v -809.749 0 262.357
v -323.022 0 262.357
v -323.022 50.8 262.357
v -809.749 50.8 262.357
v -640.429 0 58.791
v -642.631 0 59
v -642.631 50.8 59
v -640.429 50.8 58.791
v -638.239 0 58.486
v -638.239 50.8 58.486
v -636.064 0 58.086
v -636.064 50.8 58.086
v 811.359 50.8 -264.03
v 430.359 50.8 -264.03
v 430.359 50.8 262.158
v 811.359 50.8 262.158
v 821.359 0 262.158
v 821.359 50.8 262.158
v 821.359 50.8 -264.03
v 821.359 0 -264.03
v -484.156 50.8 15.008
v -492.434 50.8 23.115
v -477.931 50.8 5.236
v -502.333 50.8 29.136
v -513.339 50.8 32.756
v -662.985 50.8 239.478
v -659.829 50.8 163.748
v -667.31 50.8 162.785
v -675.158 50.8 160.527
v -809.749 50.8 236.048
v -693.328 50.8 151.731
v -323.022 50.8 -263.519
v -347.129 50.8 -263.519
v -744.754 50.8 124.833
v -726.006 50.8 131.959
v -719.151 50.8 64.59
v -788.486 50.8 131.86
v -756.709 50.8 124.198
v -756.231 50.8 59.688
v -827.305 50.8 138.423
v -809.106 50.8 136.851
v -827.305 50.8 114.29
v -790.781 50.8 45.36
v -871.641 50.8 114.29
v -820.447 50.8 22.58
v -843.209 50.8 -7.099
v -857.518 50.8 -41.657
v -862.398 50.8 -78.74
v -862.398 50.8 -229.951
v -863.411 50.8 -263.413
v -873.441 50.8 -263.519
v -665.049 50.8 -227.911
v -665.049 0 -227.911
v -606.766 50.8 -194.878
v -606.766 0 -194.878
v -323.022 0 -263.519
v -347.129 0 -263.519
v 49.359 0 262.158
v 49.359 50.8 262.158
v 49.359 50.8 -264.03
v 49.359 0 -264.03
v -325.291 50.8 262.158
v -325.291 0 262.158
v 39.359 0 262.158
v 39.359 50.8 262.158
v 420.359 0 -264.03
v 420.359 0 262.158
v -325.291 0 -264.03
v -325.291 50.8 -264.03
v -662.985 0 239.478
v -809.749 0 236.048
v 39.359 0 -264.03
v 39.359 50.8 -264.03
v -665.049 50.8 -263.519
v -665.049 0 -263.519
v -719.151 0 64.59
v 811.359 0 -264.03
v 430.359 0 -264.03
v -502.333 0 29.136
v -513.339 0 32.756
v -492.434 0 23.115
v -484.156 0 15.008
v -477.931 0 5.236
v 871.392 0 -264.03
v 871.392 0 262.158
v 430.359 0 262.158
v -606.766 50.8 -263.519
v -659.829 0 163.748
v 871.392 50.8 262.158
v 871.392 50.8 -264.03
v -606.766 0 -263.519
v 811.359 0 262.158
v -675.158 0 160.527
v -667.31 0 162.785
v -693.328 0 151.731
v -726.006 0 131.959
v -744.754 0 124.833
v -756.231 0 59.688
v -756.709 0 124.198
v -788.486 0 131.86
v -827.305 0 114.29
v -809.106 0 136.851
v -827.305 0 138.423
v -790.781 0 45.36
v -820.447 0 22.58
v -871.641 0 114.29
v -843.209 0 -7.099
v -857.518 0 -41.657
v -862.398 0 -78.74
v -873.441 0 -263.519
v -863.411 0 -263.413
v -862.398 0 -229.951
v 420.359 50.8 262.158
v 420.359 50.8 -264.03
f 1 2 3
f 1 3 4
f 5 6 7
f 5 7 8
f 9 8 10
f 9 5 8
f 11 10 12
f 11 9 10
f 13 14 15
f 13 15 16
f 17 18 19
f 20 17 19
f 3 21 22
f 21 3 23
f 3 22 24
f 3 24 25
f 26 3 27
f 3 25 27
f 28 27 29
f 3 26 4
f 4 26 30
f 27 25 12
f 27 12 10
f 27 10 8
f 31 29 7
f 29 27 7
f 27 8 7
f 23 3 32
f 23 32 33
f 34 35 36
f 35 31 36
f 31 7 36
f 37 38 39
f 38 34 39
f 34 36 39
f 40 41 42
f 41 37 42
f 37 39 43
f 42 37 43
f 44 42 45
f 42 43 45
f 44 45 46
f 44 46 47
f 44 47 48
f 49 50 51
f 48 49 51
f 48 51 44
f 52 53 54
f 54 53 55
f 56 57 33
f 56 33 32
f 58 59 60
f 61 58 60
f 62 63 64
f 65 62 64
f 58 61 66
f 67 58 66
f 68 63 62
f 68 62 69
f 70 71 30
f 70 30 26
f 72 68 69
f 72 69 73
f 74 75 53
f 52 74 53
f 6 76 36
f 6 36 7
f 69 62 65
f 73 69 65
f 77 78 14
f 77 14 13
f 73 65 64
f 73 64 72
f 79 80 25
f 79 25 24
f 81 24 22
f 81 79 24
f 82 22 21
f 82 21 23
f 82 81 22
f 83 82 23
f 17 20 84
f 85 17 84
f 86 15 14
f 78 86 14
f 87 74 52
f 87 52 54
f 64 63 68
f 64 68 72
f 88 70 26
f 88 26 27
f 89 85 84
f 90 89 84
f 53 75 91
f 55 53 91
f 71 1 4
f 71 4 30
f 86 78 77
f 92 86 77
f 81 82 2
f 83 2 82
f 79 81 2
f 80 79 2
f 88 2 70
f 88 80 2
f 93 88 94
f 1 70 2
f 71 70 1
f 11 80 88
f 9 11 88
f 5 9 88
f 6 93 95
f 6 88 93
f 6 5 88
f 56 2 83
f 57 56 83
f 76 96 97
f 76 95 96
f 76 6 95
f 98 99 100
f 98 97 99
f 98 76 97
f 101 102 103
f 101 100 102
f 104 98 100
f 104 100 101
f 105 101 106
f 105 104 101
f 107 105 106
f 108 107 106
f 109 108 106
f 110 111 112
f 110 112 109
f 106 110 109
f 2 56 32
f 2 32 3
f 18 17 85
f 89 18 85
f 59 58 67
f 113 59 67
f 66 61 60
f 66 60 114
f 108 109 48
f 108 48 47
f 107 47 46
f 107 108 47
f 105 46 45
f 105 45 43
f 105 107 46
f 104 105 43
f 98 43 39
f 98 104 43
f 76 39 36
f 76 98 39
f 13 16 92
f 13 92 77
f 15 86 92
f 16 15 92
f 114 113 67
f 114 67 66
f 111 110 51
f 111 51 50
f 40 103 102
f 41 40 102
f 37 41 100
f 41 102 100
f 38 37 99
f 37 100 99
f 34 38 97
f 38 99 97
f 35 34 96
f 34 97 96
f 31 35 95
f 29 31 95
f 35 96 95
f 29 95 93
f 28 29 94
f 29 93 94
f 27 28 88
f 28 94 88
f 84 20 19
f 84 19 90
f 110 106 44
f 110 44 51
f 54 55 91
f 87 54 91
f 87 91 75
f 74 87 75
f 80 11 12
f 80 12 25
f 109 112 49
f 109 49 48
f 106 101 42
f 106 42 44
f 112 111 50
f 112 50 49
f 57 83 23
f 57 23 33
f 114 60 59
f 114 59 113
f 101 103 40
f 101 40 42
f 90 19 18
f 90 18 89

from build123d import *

# Parameters (mm, degrees)
SKETCH1_W             = 1196.683499022
SKETCH1_H             = 526.187924251
BOSS_EXTRUDE1_DEPTH   = 50.8
SKETCH2_W             = 10
SKETCH2_H             = 538.350737467
CUT_EXTRUDE5_DEPTH    = 912.930045105
BOSS_EXTRUDE2_DEPTH   = 50.8
BOSS_EXTRUDE2_2_DEPTH = 50.8


with BuildPart() as part:
    # Sketch1 → Boss-Extrude1 (new body)
    with BuildSketch(Plane(origin=(0, 0, 0), x_dir=(1, 0, 0), z_dir=(0, 1, 0))):
        with Locations((273.050289715, 0.935735331)):
            Rectangle(SKETCH1_W, SKETCH1_H)
    extrude(amount=BOSS_EXTRUDE1_DEPTH)

    # Sketch2 → Cut-Extrude5 (cut, through all)
    with BuildSketch(Plane(origin=(0, 50.8, 0), x_dir=(1, 0, 0), z_dir=(0, 1, 0))):
        with Locations((425.358540204, 0.779686245)):
            Rectangle(SKETCH2_W, SKETCH2_H)
        with Locations((44.358540204, 0.779686245)):
            Rectangle(SKETCH2_W, SKETCH2_H)
        with Locations((-330.291459796, 0.779686245)):
            Rectangle(SKETCH2_W, SKETCH2_H)
        with Locations((816.358540204, 0.779686245)):
            Rectangle(SKETCH2_W, SKETCH2_H)
    extrude(amount=-CUT_EXTRUDE5_DEPTH, mode=Mode.SUBTRACT)


with BuildPart() as cut_extrude5_piece_1:
    # of the separate pieces the step leaves, piece 1, a body of its own (cut_extrude5_pieces)
    add(part.part.solids().sort_by_distance((430.358540204, 0, 262.158226794))[0])


with BuildPart() as cut_extrude5_piece_2:
    # of the separate pieces the step leaves, piece 2, a body of its own (cut_extrude5_pieces)
    add(part.part.solids().sort_by_distance((49.358540204, 0, 262.158226794))[0])


with BuildPart() as cut_extrude5_piece_3:
    # of the separate pieces the step leaves, piece 3, a body of its own (cut_extrude5_pieces)
    add(part.part.solids().sort_by_distance((-325.291459796, 0, 262.158226794))[0])


with BuildPart() as cut_extrude5_piece_4:
    # of the separate pieces the step leaves, piece 4, a body of its own (cut_extrude5_pieces)
    add(part.part.solids().sort_by_distance((871.392039226, 0, 262.158226794))[0])


with BuildPart() as body_5:
    # Sketch3 → Boss-Extrude2 (new body)
    with BuildSketch(Plane(origin=(0, 0, 0), x_dir=(1, 0, 0), z_dir=(0, 1, 0))):
        with BuildLine():
            Line((-323.022309341, 263.51884305), (-323.022309341, -262.356983028))
            Line((-323.022309341, -262.356983028), (-809.749405531, -262.356983028))
            Line((-809.749405531, -262.356983028), (-809.749405531, -236.047842805))
            Line((-809.749405531, -236.047842805), (-662.985161767, -239.477626694))
            Line((-662.985161767, -239.477626694), (-659.829397565, -163.748236388))
            add(Edge.make_bspline(
                [(-827.305117277, -138.423193725), (-792.273117361, -138.423193725), (-743.797362049, -100.228210329), (-689.293747089, -162.520410056), (-659.829397565, -163.748236388)],
                knots=[0, 0, 0, 0, 0.467854577, 1, 1, 1, 1], degree=3))
            Line((-827.305117277, -138.423193725), (-827.305117277, -114.290321726))
            Line((-827.305117277, -114.290321726), (-871.641101875, -114.290321726))
            Line((-871.641101875, -114.290321726), (-873.441151591, 263.51884305))
            Line((-873.441151591, 263.51884305), (-863.411210196, 263.413235142))
            Line((-863.411210196, 263.413235142), (-862.397867535, 229.951182956))
            Line((-862.397867535, 229.951182956), (-862.397867535, 78.74))
            ThreePointArc((-862.397867535, 78.74), (-820.446801819, -22.580287127), (-719.150807137, -64.589976003))
            Line((-719.150807137, -64.589976003), (-642.631043373, -59.000143107))
            ThreePointArc((-642.631043373, -59.000143107), (-639.332387346, -58.650584514), (-636.063576939, -58.086491159))
            Line((-636.063576939, -58.086491159), (-513.339441144, -32.756452519))
            ThreePointArc((-513.339441144, -32.756452519), (-492.433794564, -23.115048161), (-477.930602029, -5.236006151))
            Line((-477.930602029, -5.236006151), (-347.129420906, 263.51884305))
            Line((-347.129420906, 263.51884305), (-323.022309341, 263.51884305))
        make_face()
    extrude(amount=BOSS_EXTRUDE2_DEPTH)


with BuildPart() as body_6:
    # Sketch3 → Boss-Extrude2 2 (new body)
    with BuildSketch(Plane(origin=(0, 0, 0), x_dir=(1, 0, 0), z_dir=(0, 1, 0))):
        Polygon((-606.766159206, 263.51884305), (-665.048893777, 263.51884305), (-665.048893777, 227.910987393), (-606.766159206, 194.877712853), align=None)
    extrude(amount=BOSS_EXTRUDE2_2_DEPTH)


solid = Compound([cut_extrude5_piece_1.part, cut_extrude5_piece_2.part, cut_extrude5_piece_3.part, cut_extrude5_piece_4.part, body_5.part, body_6.part])
